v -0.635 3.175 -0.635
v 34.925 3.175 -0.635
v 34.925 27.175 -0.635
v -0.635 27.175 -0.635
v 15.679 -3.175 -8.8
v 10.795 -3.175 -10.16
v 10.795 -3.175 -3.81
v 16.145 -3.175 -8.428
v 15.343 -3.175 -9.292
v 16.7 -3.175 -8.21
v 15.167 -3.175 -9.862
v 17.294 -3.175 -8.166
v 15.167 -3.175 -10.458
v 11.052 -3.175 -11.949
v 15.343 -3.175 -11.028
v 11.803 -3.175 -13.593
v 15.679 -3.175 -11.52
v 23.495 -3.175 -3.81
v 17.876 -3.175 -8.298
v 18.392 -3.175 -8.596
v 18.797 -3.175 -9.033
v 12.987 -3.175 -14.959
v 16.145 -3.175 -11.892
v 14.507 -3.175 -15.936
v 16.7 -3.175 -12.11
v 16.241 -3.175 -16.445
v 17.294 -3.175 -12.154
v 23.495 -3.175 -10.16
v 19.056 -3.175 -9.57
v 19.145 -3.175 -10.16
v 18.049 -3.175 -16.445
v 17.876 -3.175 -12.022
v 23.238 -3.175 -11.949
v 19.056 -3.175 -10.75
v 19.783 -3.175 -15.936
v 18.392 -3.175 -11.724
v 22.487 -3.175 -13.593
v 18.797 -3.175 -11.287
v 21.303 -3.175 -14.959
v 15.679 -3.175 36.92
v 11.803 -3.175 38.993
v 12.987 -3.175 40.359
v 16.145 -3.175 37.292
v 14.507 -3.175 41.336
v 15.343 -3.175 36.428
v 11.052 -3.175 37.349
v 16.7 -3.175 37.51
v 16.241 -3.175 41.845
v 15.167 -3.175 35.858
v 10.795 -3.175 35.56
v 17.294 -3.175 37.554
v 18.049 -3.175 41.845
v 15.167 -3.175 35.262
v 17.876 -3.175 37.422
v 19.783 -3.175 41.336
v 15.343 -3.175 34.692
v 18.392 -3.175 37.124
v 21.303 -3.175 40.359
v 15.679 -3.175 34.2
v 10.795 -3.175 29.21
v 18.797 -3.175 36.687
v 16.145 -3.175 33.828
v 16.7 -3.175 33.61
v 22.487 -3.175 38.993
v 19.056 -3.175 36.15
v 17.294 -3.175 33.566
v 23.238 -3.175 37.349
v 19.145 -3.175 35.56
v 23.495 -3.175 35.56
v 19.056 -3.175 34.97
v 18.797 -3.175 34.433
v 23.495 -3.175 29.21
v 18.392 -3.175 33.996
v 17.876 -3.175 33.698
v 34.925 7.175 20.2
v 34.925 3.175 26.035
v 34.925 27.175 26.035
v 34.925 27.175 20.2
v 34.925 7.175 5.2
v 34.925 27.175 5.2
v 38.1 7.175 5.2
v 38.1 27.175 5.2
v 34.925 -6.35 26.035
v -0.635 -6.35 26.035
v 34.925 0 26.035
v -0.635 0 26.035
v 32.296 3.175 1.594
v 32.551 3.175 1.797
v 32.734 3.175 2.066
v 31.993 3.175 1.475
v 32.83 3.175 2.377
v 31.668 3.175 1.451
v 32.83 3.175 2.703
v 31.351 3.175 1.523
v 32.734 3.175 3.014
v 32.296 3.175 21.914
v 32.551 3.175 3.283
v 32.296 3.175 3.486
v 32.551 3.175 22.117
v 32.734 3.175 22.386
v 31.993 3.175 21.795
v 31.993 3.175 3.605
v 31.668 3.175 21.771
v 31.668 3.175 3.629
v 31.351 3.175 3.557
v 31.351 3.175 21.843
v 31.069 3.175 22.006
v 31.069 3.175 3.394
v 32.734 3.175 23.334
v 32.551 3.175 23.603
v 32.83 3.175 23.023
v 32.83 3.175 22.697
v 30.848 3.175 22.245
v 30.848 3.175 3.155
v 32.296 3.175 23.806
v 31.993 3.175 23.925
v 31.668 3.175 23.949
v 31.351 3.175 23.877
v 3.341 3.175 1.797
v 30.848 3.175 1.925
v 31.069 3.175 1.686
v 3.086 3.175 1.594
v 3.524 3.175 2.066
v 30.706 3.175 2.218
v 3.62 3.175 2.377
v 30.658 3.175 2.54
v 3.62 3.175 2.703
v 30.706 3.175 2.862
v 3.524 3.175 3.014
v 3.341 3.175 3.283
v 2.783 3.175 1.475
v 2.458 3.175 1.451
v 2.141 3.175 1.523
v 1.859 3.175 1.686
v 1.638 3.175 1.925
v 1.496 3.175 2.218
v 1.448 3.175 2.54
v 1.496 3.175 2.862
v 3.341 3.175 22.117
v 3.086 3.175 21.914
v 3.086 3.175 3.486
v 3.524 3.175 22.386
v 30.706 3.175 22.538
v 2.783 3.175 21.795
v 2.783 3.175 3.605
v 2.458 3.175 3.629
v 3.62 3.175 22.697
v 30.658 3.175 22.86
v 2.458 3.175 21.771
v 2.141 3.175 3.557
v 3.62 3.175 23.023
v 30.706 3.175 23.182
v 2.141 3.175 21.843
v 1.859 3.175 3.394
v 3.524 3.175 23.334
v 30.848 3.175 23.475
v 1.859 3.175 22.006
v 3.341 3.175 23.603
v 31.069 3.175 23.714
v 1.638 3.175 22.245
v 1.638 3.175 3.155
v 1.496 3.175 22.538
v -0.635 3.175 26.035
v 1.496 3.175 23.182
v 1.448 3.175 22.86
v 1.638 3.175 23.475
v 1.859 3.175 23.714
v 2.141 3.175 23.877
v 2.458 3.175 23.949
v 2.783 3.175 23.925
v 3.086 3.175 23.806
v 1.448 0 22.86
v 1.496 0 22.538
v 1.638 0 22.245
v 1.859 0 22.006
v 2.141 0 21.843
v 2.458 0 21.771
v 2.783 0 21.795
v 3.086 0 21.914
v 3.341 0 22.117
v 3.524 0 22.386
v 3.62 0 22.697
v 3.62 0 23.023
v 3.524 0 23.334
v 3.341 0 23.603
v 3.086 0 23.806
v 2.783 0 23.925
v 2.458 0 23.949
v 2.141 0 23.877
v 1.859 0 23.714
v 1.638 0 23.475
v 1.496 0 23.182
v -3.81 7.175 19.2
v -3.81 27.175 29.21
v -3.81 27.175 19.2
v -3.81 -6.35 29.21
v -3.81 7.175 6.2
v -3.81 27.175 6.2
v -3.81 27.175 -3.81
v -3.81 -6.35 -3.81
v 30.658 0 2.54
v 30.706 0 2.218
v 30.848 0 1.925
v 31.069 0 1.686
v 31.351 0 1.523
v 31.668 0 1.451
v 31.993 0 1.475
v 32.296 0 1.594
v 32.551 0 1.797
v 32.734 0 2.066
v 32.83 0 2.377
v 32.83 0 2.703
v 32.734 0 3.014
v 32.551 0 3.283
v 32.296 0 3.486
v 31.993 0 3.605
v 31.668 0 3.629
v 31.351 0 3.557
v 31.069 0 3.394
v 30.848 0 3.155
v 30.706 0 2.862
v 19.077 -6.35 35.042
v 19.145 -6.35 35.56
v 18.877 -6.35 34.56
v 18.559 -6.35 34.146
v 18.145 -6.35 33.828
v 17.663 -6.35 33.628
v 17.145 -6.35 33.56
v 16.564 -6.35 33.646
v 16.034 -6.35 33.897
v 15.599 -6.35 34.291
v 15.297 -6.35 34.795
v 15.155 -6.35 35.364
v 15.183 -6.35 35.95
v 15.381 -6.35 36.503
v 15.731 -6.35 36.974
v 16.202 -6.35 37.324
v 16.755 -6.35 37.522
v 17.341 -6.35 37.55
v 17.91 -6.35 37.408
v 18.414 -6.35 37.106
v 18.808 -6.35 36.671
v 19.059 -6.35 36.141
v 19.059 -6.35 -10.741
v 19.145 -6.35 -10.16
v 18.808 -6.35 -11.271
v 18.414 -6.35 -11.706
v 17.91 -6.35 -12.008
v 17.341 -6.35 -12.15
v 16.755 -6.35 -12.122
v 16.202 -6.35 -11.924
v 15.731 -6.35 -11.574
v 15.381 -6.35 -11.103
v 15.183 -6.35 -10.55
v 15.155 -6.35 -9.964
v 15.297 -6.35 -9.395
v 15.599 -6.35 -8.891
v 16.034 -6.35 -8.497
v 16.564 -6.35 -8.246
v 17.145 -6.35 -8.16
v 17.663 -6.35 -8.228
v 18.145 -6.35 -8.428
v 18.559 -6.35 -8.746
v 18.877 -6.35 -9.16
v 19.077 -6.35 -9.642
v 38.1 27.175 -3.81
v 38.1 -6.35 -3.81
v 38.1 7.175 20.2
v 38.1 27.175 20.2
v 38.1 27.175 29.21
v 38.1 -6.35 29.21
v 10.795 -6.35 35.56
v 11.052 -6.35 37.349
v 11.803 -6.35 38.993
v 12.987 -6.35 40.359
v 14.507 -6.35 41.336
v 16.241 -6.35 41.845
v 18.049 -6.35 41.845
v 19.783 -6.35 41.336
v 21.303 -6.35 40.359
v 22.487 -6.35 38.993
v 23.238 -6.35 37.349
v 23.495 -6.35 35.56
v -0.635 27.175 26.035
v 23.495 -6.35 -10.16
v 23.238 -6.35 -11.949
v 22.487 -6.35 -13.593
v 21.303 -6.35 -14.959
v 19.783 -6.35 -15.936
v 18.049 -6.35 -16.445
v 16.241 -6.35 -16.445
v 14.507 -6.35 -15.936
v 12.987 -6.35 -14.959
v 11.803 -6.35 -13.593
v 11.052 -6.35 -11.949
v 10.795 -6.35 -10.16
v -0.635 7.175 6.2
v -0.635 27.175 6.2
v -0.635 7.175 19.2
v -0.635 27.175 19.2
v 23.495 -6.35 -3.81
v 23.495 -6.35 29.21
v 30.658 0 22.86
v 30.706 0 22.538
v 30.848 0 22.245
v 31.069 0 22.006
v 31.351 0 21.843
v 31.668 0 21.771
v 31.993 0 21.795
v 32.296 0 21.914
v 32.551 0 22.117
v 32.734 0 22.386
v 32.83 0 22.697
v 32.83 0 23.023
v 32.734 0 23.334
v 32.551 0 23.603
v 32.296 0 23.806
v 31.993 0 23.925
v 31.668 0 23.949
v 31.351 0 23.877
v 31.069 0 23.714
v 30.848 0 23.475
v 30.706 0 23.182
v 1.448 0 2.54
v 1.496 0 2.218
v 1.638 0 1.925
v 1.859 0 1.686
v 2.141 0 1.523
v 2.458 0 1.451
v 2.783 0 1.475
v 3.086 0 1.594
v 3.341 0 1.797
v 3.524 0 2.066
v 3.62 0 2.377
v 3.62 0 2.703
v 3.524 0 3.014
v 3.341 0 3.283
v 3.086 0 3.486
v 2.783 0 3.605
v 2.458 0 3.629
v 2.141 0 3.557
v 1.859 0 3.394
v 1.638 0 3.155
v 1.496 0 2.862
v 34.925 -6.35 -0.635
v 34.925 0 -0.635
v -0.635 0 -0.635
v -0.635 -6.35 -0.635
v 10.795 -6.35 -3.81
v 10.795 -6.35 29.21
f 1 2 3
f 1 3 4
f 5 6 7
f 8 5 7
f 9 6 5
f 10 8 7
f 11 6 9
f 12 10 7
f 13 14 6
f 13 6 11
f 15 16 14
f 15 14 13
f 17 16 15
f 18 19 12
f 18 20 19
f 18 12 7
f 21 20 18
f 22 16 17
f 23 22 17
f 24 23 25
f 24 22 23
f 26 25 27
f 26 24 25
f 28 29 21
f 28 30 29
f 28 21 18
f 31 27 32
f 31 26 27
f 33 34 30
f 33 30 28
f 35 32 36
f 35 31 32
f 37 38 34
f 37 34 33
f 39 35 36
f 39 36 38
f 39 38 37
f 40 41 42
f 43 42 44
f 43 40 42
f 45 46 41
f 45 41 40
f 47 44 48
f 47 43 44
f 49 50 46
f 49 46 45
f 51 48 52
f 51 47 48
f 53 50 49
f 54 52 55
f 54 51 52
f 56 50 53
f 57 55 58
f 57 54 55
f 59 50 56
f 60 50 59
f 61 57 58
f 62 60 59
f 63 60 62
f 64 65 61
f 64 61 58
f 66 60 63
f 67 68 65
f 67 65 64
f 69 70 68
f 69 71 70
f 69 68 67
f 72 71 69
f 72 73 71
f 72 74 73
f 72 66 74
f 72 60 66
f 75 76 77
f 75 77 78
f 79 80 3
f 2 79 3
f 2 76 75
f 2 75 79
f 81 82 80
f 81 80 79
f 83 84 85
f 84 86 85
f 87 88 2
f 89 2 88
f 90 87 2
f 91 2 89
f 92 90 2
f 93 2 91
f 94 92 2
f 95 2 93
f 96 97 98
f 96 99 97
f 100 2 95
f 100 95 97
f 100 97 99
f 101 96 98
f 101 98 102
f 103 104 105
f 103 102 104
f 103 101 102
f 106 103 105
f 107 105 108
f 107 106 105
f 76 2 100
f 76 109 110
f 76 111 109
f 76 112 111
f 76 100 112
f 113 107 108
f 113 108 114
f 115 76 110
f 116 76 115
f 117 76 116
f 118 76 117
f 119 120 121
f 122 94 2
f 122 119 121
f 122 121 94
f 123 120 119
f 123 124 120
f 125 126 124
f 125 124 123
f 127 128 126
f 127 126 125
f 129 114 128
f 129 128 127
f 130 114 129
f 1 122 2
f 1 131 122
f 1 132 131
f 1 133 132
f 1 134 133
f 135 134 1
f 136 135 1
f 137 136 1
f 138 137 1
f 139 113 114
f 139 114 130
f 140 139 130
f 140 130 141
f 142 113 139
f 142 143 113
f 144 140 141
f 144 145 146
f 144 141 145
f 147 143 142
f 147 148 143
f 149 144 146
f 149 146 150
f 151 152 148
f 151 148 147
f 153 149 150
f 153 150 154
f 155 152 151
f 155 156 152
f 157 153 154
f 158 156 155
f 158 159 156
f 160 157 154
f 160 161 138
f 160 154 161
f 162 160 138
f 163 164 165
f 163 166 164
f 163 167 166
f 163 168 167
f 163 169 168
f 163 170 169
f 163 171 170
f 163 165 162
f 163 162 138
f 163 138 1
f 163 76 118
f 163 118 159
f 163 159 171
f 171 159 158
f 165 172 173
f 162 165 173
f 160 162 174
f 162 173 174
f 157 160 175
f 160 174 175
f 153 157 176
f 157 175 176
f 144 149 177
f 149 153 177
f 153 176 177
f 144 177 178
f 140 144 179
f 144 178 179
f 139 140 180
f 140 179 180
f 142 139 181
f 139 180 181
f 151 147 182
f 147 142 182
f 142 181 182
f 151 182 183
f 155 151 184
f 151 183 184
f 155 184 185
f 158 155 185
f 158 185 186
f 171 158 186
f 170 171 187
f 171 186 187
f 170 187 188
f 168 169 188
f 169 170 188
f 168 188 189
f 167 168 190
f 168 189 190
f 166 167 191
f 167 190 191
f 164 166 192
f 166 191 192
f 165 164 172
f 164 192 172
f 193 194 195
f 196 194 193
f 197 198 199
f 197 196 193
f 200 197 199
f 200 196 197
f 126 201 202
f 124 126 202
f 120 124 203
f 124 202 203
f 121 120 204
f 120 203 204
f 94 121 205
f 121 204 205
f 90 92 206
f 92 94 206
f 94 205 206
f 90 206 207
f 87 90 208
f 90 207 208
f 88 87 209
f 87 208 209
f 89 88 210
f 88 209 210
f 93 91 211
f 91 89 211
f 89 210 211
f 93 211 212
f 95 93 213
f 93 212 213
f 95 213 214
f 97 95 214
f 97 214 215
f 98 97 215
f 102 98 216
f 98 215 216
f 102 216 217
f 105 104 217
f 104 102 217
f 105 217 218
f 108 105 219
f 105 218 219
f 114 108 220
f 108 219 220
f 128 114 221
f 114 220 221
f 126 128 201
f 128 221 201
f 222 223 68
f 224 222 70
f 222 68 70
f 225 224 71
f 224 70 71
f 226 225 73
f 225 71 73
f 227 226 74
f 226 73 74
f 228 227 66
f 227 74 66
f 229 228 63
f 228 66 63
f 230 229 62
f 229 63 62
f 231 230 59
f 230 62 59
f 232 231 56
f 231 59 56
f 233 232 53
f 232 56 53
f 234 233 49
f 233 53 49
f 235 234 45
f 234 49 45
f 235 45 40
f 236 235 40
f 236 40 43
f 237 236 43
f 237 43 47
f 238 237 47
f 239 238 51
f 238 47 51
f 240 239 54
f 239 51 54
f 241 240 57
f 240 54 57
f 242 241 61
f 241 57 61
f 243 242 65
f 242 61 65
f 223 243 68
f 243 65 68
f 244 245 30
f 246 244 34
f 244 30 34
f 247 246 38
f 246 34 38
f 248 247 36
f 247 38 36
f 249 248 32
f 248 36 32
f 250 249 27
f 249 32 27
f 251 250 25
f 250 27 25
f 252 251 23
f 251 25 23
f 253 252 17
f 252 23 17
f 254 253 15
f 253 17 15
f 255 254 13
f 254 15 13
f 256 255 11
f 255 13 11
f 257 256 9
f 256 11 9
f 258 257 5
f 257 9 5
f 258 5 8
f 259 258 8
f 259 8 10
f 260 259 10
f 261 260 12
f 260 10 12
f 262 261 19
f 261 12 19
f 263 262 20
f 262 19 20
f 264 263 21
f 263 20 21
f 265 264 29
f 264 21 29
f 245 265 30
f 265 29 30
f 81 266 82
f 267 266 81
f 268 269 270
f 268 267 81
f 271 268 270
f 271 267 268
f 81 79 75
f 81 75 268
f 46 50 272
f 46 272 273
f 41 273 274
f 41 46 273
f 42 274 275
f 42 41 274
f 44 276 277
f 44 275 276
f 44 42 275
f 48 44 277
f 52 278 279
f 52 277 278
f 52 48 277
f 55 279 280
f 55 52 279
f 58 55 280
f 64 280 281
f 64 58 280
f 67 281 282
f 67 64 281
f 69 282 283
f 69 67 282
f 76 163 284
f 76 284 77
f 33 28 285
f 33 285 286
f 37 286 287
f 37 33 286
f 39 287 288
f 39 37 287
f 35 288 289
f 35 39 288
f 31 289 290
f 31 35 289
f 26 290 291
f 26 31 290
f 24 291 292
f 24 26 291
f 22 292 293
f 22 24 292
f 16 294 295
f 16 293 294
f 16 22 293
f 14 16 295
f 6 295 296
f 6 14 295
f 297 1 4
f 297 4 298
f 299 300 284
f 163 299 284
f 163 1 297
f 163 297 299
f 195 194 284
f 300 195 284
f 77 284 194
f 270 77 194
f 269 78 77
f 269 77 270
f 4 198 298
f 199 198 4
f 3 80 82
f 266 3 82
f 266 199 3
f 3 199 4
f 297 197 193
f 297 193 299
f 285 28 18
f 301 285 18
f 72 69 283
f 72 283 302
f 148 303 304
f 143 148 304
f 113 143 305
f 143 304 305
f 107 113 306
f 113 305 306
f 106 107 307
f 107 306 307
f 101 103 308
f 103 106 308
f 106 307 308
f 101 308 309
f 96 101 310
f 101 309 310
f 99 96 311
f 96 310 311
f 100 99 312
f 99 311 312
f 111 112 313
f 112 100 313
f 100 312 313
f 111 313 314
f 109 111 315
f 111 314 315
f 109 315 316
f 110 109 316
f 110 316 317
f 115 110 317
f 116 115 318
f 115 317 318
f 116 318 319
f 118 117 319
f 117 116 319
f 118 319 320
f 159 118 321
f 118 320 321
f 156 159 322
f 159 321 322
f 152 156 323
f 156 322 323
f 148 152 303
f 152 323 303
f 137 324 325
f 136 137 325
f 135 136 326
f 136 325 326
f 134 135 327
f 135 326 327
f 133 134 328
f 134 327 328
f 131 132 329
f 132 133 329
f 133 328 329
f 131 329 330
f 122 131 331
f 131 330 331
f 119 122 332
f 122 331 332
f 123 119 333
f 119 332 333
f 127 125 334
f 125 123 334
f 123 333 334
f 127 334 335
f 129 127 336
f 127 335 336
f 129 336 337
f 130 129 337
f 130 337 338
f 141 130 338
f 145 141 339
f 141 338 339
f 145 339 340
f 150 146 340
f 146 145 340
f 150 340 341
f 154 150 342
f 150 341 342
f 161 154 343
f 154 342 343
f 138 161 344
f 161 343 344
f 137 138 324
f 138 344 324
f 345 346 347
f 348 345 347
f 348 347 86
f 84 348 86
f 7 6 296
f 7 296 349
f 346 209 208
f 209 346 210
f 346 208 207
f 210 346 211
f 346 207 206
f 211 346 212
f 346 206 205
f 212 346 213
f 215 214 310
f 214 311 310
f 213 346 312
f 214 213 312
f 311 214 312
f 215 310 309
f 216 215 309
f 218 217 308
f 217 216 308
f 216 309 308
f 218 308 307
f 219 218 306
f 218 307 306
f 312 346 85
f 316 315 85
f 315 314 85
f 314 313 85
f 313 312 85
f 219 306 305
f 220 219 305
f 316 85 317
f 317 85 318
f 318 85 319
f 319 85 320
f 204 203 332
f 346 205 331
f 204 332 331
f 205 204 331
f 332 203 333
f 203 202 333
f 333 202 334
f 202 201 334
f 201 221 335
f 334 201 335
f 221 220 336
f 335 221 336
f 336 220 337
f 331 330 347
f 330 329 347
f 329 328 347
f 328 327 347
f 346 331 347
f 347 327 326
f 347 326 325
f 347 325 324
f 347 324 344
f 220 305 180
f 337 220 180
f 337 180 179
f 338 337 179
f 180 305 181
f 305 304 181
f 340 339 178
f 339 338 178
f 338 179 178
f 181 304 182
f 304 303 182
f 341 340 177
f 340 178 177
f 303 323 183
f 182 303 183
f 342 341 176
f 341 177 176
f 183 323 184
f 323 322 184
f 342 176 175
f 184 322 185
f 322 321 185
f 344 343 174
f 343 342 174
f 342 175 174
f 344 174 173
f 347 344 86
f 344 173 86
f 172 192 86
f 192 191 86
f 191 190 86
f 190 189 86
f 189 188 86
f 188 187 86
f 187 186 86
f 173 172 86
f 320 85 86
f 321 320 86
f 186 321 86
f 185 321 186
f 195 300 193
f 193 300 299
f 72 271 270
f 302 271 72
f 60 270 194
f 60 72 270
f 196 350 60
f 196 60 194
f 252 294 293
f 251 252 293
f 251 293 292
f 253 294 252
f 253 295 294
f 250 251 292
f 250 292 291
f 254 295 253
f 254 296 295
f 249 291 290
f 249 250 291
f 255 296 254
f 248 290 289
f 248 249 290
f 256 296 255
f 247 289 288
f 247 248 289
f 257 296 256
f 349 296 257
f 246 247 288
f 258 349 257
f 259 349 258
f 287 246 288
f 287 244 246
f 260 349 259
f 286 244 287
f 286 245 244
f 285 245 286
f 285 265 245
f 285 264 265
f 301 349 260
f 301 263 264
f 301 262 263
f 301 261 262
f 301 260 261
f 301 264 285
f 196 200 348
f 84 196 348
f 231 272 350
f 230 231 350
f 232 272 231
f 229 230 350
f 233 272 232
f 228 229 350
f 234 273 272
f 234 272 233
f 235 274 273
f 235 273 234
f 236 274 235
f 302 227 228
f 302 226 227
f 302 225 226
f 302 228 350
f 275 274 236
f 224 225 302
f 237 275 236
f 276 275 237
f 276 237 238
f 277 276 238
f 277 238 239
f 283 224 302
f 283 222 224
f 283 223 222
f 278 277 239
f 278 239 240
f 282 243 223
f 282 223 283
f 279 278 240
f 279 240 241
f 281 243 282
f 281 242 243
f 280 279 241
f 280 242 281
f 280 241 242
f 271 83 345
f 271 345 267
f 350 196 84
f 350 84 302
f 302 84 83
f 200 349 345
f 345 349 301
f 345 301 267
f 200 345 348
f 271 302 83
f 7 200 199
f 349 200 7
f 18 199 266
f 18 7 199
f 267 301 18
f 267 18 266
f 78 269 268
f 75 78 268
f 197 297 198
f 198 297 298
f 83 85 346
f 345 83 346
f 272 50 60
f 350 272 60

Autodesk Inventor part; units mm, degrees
ref_plane "YZ Plane" through (0, 0, 0) normal (1, 0, 0) x (0, 1, 0)
ref_plane "XZ Plane" through (0, 0, 0) normal (0, 1, 0) x (-1, 0, 0)
ref_plane "XY Plane" through (0, 0, 0) normal (0, 0, 1) x (1, 0, 0)
sketch "Sketch1" plane through (0, 0, 0) normal (0, 1, 0) x (-1, 0, 0)
  line L0 (0, 0) -> (-34.29, 0)
  line L1 (-34.29, 0) -> (-34.29, 25.4)
  line L2 (-34.29, 25.4) -> (0, 25.4)
  line L3 (0, 25.4) -> (0, 0)
  line L4 (0, 25.4) -> (-2.54, 25.4) construction
  line L5 (-2.54, 25.4) -> (-2.54, 22.86) construction
  line L6 (-2.54, 22.86) -> (0, 22.86) construction
  line L7 (0, 22.86) -> (0, 25.4) construction
  line L8 (0, 0) -> (-2.54, 0) construction
  line L9 (-2.54, 0) -> (-2.54, 2.54) construction
  line L10 (-2.54, 2.54) -> (0, 2.54) construction
  line L11 (0, 2.54) -> (0, 0) construction
  line L12 (-34.29, 25.4) -> (-31.75, 25.4) construction
  line L13 (-31.75, 25.4) -> (-31.75, 22.86) construction
  line L14 (-31.75, 22.86) -> (-34.29, 22.86) construction
  line L15 (-34.29, 22.86) -> (-34.29, 25.4) construction
  line L16 (-34.29, 0) -> (-31.75, 0) construction
  line L17 (-31.75, 0) -> (-31.75, 2.54) construction
  line L18 (-31.75, 2.54) -> (-34.29, 2.54) construction
  line L19 (-34.29, 2.54) -> (-34.29, 0) construction
  circle A0 centre (-2.54, 22.86) radius 1.0922
  circle A1 centre (-2.54, 2.54) radius 1.0922
  circle A2 centre (-31.75, 2.54) radius 1.0922
  circle A3 centre (-31.75, 22.86) radius 1.0922
  line L20 (0.635, 26.035) -> (-34.925, 26.035)
  line L21 (-34.925, 26.035) -> (-34.925, -0.635)
  line L22 (-34.925, -0.635) -> (0.635, -0.635)
  line L23 (0.635, -0.635) -> (0.635, 26.035)
  dimension "d0" = 34.29
  dimension "d1" = 25.4
  dimension "d2" = 2.54
  dimension "d3" = 2.54
  dimension "d4" = 2.54
  dimension "d5" = 2.54
  dimension "d6" = 2.54
  dimension "d7" = 2.54
  dimension "d8" = 2.54
  dimension "d9" = 2.54
  dimension "d10" = 2.1844
  dimension "d11" = 2.1844
  dimension "d12" = 2.1844
  dimension "d13" = 2.1844
  dimension "d14" = 0.635
extrude "Extrusion1" add sketch "Sketch1" along normal blind 3.175 contours L0 L1 L2 L3 | L23 L22 L21 L20
sketch "Sketch2" plane through (0, 3.175, 0) normal (0, 1, 0) x (1, 0, 0)
  line L0 (34.925, -26.035) -> (34.925, 0.635) projected
  line L1 (34.925, 0.635) -> (-0.635, 0.635) projected
  line L2 (-0.635, 0.635) -> (-0.635, -26.035) projected
  line L3 (-0.635, -26.035) -> (34.925, -26.035) projected
  circle A0 centre (2.54, -22.86) radius 1.0922 projected
  circle A1 centre (2.54, -2.54) radius 1.0922 projected
  circle A2 centre (31.75, -2.54) radius 1.0922 projected
  circle A3 centre (31.75, -22.86) radius 1.0922 projected
  line L4 (-3.81, -29.21) -> (-3.81, 3.81)
  line L5 (-3.81, 3.81) -> (38.1, 3.81)
  line L6 (38.1, 3.81) -> (38.1, -29.21)
  line L7 (38.1, -29.21) -> (-3.81, -29.21)
  point P0 (0, 0)
  dimension "d17" = 3.175
extrude "Extrusion2" add sketch "Sketch2" along normal blind 24 and the other way blind 3.175 contours L4 L5 L6 L7
sketch "Sketch3" plane through (38.1, 0, -3.81) normal (1, 0, 0) x (0, 0, -1)
  line L0 (-3.175, 27.175) -> (-29.845, 27.175) projected
  line L1 (-16.51, 27.175) -> (-24.01, 27.175)
  line L2 (-24.01, 27.175) -> (-9.01, 27.175)
  line L3 (-9.01, 27.175) -> (-9.01, 3.175)
  line L4 (-29.845, 3.175) -> (-3.175, 3.175) projected
  line L5 (-24.01, 27.175) -> (-24.01, 3.175)
  point P0 (-3.81, 0)
  dimension "d22" = 7.5
  dimension "d23" = 15
extrude "Extrusion3" cut sketch "Sketch3" against normal blind 24
sketch "Sketch4" plane through (-0.635, 3.175, 26.035) normal (1, 0, 0) x (0, 0, -1)
  line L0 (29.845, 24) -> (-3.175, 24) projected
  line L1 (13.335, 24) -> (6.835, 24)
  line L2 (6.835, 24) -> (19.835, 24)
  line L3 (26.67, 0) -> (0, 0) projected
  line L4 (19.835, 24) -> (6.835, 24)
  line L5 (6.835, 24) -> (6.835, 0)
  line L6 (6.835, 0) -> (19.835, 0)
  line L7 (19.835, 0) -> (19.835, 24)
  point P0 (26.035, -3.175)
  dimension "d26" = 6.5
  dimension "d27" = 13
extrude "Extrusion4" cut sketch "Sketch4" against normal blind 24
sketch "Sketch5" plane through (0, 0, 0) normal (0, -1, 0) x (1, 0, 0)
  line L0 (38.1, -3.81) -> (38.1, 29.21) projected
  line L1 (38.1, 29.21) -> (-3.81, 29.21) projected
  line L2 (-3.81, 29.21) -> (-3.81, -3.81) projected
  line L3 (-3.81, -3.81) -> (38.1, -3.81) projected
  circle A0 centre (2.54, 22.86) radius 1.0922 projected
  circle A1 centre (2.54, 2.54) radius 1.0922 projected
  circle A2 centre (31.75, 2.54) radius 1.0922 projected
  circle A3 centre (31.75, 22.86) radius 1.0922 projected
  line L4 (-0.635, -0.635) -> (-0.635, 26.035)
  line L5 (-0.635, 26.035) -> (34.925, 26.035)
  line L6 (34.925, 26.035) -> (34.925, -0.635)
  line L7 (34.925, -0.635) -> (-0.635, -0.635)
  line L8 (17.145, 29.21) -> (17.145, 35.56)
  line L9 (17.145, -3.81) -> (17.145, -10.16)
  circle A4 centre (17.145, 35.56) radius 2
  circle A5 centre (17.145, -10.16) radius 2
  circle A6 centre (17.145, 35.56) radius 6.35
  circle A7 centre (17.145, -10.16) radius 6.35
  line L10 (23.495, 35.56) -> (23.495, 29.21)
  line L11 (10.795, 35.56) -> (10.795, 29.21)
  line L12 (10.795, -10.16) -> (10.795, -3.81)
  line L13 (23.495, -10.16) -> (23.495, -3.81)
  point P0 (0, 0)
  dimension "d30" = 3.175
  dimension "d31" = 6.35
  dimension "d32" = 6.35
  dimension "d33" = 4
  dimension "d34" = 4
extrude "Extrusion5" add sketch "Sketch5" along normal blind 6.35 contours L3 L2 L1 L0 | L13 A7 L3 | L1 A6 L10 | A7 L12 L3 | A7 | L1 L11 A6 | A6
sketch "Sketch6" plane through (0, 3.175, 0) normal (0, 1, 0) x (1, 0, 0)
  circle A0 centre (31.75, -22.86) radius 1.0922 projected
  circle A1 centre (31.75, -2.54) radius 1.0922 projected
  circle A2 centre (2.54, -2.54) radius 1.0922 projected
  circle A3 centre (2.54, -22.86) radius 1.0922 projected
  line L0 (34.925, -5.2) -> (34.925, 0.635) projected
  line L1 (34.925, 0.635) -> (-0.635, 0.635) projected
  line L2 (-0.635, 0.635) -> (-0.635, -6.2) projected
  line L3 (-0.635, -6.2) -> (-3.81, -6.2) projected
  line L4 (-3.81, -19.2) -> (-3.81, -6.2) projected
  line L5 (-0.635, -19.2) -> (-3.81, -19.2) projected
  line L6 (-0.635, -19.2) -> (-0.635, -26.035) projected
  line L7 (-0.635, -26.035) -> (34.925, -26.035) projected
  line L8 (34.925, -26.035) -> (34.925, -20.2) projected
  line L9 (38.1, -20.2) -> (34.925, -20.2) projected
  line L10 (38.1, -5.2) -> (38.1, -20.2) projected
  line L11 (38.1, -5.2) -> (34.925, -5.2) projected
  line L12 (-0.635, -6.2) -> (-0.635, -19.2)
  line L13 (34.925, -5.2) -> (34.925, -20.2)
  point P0 (0, 0)
extrude "Extrusion6" add sketch "Sketch6" along normal blind 4 contours L11 L10 L9 L13 | L12 L5 L4 L3
sketch "Sketch7" plane through (0, 0, 0) normal (0, 1, 0) x (1, 0, 0)
  line L0 (10.795, 3.81) -> (23.495, 3.81) projected
  line L1 (23.495, 10.16) -> (23.495, 3.81) projected
  arc A0 (23.495, 10.16) -> (10.795, 10.16) centre (17.145, 10.16) ccw projected
  line L2 (10.795, 3.81) -> (10.795, 10.16) projected
  circle A1 centre (17.145, 10.16) radius 2 projected
  circle A2 centre (17.145, -35.56) radius 2 projected
  line L3 (23.495, -29.21) -> (10.795, -29.21) projected
  line L4 (10.795, -35.56) -> (10.795, -29.21) projected
  arc A3 (10.795, -35.56) -> (23.495, -35.56) centre (17.145, -35.56) ccw projected
  line L5 (23.495, -29.21) -> (23.495, -35.56) projected
  point P0 (0, 0)
extrude "Extrusion7" cut sketch "Sketch7" against normal blind 3.175
properties part number "pololuCaseBottom"
